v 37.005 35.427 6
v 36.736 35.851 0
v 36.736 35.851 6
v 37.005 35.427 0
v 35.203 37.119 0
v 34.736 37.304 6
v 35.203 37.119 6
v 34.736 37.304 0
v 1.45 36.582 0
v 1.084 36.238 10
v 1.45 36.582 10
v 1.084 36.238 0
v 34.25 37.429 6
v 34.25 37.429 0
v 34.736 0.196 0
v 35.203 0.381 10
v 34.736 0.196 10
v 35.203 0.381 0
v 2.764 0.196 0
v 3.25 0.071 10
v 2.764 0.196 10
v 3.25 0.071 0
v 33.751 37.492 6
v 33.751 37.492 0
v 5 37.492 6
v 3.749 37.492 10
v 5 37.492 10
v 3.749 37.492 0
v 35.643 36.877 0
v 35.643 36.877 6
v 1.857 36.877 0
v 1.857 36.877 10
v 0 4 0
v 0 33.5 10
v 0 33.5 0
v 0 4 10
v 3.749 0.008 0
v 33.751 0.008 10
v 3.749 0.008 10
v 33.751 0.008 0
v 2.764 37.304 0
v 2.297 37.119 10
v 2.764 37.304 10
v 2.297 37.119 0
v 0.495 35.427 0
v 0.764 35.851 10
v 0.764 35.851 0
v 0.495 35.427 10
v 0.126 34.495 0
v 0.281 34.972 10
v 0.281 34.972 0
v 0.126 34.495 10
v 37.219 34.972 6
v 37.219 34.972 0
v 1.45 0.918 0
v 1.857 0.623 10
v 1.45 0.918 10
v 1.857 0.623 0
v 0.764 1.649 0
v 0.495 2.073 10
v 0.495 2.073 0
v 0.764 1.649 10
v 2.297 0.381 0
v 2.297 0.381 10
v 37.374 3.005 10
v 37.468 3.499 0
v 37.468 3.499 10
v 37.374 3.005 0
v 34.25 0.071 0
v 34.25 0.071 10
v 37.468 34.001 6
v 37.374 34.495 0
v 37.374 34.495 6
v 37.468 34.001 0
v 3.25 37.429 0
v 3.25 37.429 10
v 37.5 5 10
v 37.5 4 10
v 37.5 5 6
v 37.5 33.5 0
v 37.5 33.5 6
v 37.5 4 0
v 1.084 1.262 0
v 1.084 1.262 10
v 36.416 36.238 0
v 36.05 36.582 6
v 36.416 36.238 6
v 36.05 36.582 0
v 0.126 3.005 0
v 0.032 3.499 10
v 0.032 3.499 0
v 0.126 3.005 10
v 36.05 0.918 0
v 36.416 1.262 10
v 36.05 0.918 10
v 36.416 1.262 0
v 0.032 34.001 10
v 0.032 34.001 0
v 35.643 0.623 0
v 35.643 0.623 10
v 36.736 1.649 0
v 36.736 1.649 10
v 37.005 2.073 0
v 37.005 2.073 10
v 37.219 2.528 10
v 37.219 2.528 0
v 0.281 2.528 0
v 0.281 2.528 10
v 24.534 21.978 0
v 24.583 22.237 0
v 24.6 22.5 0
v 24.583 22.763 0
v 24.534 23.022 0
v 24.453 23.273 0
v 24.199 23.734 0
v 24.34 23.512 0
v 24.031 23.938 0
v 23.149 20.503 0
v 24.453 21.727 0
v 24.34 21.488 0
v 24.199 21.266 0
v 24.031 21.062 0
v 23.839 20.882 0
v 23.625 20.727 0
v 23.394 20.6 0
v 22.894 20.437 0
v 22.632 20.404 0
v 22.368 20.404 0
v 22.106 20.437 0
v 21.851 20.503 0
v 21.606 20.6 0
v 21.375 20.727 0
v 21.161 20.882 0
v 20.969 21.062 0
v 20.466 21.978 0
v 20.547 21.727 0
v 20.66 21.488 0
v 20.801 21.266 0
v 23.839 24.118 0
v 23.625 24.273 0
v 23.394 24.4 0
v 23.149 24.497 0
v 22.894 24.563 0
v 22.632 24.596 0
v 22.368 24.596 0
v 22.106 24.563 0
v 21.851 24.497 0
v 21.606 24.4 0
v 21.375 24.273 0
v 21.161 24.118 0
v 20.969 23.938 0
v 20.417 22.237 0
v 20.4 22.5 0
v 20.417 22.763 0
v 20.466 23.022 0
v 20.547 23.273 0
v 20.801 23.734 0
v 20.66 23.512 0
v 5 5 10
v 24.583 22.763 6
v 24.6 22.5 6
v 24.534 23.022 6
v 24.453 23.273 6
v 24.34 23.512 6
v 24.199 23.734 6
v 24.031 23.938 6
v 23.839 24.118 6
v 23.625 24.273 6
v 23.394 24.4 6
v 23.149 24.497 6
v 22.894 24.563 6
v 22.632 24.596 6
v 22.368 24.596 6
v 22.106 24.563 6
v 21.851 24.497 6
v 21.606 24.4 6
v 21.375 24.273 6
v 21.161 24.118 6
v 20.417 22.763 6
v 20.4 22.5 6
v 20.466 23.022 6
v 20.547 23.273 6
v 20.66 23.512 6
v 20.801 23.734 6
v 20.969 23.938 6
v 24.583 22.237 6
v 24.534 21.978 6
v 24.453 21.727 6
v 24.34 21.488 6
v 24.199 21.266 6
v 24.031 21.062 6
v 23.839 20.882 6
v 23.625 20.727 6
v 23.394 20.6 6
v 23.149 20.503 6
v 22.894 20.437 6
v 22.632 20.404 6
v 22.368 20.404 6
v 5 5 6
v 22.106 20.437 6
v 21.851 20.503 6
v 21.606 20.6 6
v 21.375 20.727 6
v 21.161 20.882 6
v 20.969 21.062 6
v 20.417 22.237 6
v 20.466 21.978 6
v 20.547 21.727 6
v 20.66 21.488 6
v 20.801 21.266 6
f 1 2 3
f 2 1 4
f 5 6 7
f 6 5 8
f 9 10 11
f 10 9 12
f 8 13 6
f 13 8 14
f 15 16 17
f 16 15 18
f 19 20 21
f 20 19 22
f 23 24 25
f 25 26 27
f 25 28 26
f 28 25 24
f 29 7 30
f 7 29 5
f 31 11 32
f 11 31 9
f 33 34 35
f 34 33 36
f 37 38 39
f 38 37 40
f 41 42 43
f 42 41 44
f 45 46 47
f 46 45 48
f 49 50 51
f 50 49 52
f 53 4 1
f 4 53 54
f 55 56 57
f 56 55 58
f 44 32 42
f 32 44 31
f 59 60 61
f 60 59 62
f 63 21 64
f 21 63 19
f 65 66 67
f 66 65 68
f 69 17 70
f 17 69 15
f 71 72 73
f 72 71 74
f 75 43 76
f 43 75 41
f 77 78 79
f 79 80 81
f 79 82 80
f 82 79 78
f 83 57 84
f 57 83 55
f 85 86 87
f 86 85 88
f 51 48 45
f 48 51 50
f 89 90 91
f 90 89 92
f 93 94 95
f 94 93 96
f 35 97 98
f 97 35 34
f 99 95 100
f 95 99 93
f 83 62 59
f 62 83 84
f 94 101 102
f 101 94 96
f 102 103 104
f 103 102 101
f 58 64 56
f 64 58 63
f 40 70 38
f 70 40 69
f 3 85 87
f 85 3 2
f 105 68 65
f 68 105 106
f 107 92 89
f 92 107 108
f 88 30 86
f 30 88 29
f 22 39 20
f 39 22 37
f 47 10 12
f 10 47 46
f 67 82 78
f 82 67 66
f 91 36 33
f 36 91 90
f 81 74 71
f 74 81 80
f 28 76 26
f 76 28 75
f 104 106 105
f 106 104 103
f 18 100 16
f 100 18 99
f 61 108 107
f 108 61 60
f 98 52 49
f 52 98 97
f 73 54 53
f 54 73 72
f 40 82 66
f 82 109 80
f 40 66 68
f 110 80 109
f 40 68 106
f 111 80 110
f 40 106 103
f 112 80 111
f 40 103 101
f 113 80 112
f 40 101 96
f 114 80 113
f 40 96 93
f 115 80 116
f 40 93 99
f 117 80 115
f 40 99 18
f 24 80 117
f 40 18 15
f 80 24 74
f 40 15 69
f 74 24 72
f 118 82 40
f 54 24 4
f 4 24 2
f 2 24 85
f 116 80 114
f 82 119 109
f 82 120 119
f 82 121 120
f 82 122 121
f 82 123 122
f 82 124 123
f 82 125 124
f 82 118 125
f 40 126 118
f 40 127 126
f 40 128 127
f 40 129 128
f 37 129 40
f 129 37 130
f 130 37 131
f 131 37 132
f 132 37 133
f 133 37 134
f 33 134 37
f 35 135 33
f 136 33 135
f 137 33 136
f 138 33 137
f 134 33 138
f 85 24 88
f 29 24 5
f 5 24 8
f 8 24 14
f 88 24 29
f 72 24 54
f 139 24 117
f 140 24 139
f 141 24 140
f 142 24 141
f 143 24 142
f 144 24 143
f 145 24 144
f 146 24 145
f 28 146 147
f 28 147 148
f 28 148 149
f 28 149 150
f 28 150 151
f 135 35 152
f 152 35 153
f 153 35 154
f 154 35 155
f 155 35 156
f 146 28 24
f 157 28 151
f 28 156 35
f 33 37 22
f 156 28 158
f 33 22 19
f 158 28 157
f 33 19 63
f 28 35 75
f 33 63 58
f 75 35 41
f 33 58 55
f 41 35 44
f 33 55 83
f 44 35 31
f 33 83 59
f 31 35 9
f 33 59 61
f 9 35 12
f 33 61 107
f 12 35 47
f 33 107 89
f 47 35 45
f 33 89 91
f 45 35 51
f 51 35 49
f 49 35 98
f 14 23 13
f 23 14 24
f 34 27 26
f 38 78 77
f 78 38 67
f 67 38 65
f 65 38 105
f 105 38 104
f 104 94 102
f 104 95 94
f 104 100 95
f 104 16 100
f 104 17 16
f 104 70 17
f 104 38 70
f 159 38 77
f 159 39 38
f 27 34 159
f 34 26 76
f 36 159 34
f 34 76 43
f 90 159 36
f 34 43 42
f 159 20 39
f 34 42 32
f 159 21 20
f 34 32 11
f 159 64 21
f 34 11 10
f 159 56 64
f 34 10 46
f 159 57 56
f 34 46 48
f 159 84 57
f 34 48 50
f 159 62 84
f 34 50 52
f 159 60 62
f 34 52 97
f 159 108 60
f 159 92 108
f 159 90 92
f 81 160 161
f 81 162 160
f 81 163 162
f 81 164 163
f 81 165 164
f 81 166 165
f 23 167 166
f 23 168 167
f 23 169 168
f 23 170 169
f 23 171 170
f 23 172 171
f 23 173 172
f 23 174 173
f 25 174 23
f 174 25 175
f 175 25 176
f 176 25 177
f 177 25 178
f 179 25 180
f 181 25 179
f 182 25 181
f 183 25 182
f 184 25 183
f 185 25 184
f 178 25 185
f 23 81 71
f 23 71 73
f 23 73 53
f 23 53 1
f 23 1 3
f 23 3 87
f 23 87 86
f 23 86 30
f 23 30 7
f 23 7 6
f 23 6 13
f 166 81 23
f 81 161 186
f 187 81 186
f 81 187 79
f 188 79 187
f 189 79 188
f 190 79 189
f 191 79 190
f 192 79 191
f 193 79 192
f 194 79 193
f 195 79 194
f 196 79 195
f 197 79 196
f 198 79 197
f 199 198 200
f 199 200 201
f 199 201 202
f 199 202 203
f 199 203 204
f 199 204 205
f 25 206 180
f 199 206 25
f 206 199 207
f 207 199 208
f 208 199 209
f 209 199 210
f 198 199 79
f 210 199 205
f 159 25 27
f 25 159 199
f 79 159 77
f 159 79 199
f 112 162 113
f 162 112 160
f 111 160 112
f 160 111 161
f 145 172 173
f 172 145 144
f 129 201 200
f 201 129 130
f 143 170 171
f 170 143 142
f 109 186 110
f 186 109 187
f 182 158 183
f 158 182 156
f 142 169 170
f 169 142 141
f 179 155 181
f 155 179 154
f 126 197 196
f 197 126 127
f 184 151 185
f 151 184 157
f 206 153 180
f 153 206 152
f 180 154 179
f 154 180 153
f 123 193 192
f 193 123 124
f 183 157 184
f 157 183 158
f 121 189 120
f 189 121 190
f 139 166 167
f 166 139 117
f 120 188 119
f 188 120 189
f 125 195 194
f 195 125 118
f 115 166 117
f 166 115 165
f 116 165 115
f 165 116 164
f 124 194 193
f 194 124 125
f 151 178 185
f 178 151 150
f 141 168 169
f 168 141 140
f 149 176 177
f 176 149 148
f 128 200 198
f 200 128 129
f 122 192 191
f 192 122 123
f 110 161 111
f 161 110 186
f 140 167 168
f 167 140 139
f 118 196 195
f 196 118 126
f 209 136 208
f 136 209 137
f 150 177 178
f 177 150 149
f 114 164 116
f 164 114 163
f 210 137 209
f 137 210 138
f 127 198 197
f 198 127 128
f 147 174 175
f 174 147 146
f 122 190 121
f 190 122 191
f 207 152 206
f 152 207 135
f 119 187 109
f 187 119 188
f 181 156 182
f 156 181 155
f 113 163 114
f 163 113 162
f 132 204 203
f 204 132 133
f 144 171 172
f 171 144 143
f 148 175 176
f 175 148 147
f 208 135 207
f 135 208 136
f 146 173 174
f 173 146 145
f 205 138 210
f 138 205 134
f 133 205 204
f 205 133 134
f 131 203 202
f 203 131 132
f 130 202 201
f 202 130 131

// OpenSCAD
module drilling_guide(
  hole_from_edge = 17.5,
  hole_diameter = 4.2,
  lip_size = 5
) {
  // 当てる板の厚さ
  bottom_plate_thickness = 4;
  // くり抜いた後に残る厚み (ドリルのガイドとなる穴の深さ)
  drilling_bore_depth = 10;

  guide_size = hole_from_edge + 15;  // 十分な大きさ
  fillet_radius = 4;                 // 角の丸み

  difference() {
    // 外側のブロックにフィレット処理を適用
    x_size = guide_size + lip_size;
    y_size = guide_size + lip_size;
    hull() {
      translate([fillet_radius, fillet_radius, 0])
      cylinder(h = drilling_bore_depth, r = fillet_radius, $fn = 50);
      translate([x_size - fillet_radius, fillet_radius, 0])
      cylinder(h = drilling_bore_depth, r = fillet_radius, $fn = 50);
      translate([fillet_radius, y_size - fillet_radius, 0])
      cylinder(h = drilling_bore_depth, r = fillet_radius, $fn = 50);
      translate([x_size - fillet_radius, y_size - fillet_radius, 0])
      cylinder(h = drilling_bore_depth, r = fillet_radius, $fn = 50);
    }

    // 内側の上部をくり抜いて段差を作る
    // Z方向に (drilling_bore_depth - bottom_plate_thickness) だけずらして、底面を残す
    translate([lip_size, lip_size, drilling_bore_depth - bottom_plate_thickness]) {
      cube([guide_size, guide_size, bottom_plate_thickness + 1]); // 上に貫通させるため +1 は有効
    }

    // 穴を開ける
    translate([hole_from_edge + lip_size, hole_from_edge + lip_size, -1]) {
      cylinder(d = hole_diameter, h = drilling_bore_depth + 2, $fn = 50);
    }
  }
}

drilling_guide();
